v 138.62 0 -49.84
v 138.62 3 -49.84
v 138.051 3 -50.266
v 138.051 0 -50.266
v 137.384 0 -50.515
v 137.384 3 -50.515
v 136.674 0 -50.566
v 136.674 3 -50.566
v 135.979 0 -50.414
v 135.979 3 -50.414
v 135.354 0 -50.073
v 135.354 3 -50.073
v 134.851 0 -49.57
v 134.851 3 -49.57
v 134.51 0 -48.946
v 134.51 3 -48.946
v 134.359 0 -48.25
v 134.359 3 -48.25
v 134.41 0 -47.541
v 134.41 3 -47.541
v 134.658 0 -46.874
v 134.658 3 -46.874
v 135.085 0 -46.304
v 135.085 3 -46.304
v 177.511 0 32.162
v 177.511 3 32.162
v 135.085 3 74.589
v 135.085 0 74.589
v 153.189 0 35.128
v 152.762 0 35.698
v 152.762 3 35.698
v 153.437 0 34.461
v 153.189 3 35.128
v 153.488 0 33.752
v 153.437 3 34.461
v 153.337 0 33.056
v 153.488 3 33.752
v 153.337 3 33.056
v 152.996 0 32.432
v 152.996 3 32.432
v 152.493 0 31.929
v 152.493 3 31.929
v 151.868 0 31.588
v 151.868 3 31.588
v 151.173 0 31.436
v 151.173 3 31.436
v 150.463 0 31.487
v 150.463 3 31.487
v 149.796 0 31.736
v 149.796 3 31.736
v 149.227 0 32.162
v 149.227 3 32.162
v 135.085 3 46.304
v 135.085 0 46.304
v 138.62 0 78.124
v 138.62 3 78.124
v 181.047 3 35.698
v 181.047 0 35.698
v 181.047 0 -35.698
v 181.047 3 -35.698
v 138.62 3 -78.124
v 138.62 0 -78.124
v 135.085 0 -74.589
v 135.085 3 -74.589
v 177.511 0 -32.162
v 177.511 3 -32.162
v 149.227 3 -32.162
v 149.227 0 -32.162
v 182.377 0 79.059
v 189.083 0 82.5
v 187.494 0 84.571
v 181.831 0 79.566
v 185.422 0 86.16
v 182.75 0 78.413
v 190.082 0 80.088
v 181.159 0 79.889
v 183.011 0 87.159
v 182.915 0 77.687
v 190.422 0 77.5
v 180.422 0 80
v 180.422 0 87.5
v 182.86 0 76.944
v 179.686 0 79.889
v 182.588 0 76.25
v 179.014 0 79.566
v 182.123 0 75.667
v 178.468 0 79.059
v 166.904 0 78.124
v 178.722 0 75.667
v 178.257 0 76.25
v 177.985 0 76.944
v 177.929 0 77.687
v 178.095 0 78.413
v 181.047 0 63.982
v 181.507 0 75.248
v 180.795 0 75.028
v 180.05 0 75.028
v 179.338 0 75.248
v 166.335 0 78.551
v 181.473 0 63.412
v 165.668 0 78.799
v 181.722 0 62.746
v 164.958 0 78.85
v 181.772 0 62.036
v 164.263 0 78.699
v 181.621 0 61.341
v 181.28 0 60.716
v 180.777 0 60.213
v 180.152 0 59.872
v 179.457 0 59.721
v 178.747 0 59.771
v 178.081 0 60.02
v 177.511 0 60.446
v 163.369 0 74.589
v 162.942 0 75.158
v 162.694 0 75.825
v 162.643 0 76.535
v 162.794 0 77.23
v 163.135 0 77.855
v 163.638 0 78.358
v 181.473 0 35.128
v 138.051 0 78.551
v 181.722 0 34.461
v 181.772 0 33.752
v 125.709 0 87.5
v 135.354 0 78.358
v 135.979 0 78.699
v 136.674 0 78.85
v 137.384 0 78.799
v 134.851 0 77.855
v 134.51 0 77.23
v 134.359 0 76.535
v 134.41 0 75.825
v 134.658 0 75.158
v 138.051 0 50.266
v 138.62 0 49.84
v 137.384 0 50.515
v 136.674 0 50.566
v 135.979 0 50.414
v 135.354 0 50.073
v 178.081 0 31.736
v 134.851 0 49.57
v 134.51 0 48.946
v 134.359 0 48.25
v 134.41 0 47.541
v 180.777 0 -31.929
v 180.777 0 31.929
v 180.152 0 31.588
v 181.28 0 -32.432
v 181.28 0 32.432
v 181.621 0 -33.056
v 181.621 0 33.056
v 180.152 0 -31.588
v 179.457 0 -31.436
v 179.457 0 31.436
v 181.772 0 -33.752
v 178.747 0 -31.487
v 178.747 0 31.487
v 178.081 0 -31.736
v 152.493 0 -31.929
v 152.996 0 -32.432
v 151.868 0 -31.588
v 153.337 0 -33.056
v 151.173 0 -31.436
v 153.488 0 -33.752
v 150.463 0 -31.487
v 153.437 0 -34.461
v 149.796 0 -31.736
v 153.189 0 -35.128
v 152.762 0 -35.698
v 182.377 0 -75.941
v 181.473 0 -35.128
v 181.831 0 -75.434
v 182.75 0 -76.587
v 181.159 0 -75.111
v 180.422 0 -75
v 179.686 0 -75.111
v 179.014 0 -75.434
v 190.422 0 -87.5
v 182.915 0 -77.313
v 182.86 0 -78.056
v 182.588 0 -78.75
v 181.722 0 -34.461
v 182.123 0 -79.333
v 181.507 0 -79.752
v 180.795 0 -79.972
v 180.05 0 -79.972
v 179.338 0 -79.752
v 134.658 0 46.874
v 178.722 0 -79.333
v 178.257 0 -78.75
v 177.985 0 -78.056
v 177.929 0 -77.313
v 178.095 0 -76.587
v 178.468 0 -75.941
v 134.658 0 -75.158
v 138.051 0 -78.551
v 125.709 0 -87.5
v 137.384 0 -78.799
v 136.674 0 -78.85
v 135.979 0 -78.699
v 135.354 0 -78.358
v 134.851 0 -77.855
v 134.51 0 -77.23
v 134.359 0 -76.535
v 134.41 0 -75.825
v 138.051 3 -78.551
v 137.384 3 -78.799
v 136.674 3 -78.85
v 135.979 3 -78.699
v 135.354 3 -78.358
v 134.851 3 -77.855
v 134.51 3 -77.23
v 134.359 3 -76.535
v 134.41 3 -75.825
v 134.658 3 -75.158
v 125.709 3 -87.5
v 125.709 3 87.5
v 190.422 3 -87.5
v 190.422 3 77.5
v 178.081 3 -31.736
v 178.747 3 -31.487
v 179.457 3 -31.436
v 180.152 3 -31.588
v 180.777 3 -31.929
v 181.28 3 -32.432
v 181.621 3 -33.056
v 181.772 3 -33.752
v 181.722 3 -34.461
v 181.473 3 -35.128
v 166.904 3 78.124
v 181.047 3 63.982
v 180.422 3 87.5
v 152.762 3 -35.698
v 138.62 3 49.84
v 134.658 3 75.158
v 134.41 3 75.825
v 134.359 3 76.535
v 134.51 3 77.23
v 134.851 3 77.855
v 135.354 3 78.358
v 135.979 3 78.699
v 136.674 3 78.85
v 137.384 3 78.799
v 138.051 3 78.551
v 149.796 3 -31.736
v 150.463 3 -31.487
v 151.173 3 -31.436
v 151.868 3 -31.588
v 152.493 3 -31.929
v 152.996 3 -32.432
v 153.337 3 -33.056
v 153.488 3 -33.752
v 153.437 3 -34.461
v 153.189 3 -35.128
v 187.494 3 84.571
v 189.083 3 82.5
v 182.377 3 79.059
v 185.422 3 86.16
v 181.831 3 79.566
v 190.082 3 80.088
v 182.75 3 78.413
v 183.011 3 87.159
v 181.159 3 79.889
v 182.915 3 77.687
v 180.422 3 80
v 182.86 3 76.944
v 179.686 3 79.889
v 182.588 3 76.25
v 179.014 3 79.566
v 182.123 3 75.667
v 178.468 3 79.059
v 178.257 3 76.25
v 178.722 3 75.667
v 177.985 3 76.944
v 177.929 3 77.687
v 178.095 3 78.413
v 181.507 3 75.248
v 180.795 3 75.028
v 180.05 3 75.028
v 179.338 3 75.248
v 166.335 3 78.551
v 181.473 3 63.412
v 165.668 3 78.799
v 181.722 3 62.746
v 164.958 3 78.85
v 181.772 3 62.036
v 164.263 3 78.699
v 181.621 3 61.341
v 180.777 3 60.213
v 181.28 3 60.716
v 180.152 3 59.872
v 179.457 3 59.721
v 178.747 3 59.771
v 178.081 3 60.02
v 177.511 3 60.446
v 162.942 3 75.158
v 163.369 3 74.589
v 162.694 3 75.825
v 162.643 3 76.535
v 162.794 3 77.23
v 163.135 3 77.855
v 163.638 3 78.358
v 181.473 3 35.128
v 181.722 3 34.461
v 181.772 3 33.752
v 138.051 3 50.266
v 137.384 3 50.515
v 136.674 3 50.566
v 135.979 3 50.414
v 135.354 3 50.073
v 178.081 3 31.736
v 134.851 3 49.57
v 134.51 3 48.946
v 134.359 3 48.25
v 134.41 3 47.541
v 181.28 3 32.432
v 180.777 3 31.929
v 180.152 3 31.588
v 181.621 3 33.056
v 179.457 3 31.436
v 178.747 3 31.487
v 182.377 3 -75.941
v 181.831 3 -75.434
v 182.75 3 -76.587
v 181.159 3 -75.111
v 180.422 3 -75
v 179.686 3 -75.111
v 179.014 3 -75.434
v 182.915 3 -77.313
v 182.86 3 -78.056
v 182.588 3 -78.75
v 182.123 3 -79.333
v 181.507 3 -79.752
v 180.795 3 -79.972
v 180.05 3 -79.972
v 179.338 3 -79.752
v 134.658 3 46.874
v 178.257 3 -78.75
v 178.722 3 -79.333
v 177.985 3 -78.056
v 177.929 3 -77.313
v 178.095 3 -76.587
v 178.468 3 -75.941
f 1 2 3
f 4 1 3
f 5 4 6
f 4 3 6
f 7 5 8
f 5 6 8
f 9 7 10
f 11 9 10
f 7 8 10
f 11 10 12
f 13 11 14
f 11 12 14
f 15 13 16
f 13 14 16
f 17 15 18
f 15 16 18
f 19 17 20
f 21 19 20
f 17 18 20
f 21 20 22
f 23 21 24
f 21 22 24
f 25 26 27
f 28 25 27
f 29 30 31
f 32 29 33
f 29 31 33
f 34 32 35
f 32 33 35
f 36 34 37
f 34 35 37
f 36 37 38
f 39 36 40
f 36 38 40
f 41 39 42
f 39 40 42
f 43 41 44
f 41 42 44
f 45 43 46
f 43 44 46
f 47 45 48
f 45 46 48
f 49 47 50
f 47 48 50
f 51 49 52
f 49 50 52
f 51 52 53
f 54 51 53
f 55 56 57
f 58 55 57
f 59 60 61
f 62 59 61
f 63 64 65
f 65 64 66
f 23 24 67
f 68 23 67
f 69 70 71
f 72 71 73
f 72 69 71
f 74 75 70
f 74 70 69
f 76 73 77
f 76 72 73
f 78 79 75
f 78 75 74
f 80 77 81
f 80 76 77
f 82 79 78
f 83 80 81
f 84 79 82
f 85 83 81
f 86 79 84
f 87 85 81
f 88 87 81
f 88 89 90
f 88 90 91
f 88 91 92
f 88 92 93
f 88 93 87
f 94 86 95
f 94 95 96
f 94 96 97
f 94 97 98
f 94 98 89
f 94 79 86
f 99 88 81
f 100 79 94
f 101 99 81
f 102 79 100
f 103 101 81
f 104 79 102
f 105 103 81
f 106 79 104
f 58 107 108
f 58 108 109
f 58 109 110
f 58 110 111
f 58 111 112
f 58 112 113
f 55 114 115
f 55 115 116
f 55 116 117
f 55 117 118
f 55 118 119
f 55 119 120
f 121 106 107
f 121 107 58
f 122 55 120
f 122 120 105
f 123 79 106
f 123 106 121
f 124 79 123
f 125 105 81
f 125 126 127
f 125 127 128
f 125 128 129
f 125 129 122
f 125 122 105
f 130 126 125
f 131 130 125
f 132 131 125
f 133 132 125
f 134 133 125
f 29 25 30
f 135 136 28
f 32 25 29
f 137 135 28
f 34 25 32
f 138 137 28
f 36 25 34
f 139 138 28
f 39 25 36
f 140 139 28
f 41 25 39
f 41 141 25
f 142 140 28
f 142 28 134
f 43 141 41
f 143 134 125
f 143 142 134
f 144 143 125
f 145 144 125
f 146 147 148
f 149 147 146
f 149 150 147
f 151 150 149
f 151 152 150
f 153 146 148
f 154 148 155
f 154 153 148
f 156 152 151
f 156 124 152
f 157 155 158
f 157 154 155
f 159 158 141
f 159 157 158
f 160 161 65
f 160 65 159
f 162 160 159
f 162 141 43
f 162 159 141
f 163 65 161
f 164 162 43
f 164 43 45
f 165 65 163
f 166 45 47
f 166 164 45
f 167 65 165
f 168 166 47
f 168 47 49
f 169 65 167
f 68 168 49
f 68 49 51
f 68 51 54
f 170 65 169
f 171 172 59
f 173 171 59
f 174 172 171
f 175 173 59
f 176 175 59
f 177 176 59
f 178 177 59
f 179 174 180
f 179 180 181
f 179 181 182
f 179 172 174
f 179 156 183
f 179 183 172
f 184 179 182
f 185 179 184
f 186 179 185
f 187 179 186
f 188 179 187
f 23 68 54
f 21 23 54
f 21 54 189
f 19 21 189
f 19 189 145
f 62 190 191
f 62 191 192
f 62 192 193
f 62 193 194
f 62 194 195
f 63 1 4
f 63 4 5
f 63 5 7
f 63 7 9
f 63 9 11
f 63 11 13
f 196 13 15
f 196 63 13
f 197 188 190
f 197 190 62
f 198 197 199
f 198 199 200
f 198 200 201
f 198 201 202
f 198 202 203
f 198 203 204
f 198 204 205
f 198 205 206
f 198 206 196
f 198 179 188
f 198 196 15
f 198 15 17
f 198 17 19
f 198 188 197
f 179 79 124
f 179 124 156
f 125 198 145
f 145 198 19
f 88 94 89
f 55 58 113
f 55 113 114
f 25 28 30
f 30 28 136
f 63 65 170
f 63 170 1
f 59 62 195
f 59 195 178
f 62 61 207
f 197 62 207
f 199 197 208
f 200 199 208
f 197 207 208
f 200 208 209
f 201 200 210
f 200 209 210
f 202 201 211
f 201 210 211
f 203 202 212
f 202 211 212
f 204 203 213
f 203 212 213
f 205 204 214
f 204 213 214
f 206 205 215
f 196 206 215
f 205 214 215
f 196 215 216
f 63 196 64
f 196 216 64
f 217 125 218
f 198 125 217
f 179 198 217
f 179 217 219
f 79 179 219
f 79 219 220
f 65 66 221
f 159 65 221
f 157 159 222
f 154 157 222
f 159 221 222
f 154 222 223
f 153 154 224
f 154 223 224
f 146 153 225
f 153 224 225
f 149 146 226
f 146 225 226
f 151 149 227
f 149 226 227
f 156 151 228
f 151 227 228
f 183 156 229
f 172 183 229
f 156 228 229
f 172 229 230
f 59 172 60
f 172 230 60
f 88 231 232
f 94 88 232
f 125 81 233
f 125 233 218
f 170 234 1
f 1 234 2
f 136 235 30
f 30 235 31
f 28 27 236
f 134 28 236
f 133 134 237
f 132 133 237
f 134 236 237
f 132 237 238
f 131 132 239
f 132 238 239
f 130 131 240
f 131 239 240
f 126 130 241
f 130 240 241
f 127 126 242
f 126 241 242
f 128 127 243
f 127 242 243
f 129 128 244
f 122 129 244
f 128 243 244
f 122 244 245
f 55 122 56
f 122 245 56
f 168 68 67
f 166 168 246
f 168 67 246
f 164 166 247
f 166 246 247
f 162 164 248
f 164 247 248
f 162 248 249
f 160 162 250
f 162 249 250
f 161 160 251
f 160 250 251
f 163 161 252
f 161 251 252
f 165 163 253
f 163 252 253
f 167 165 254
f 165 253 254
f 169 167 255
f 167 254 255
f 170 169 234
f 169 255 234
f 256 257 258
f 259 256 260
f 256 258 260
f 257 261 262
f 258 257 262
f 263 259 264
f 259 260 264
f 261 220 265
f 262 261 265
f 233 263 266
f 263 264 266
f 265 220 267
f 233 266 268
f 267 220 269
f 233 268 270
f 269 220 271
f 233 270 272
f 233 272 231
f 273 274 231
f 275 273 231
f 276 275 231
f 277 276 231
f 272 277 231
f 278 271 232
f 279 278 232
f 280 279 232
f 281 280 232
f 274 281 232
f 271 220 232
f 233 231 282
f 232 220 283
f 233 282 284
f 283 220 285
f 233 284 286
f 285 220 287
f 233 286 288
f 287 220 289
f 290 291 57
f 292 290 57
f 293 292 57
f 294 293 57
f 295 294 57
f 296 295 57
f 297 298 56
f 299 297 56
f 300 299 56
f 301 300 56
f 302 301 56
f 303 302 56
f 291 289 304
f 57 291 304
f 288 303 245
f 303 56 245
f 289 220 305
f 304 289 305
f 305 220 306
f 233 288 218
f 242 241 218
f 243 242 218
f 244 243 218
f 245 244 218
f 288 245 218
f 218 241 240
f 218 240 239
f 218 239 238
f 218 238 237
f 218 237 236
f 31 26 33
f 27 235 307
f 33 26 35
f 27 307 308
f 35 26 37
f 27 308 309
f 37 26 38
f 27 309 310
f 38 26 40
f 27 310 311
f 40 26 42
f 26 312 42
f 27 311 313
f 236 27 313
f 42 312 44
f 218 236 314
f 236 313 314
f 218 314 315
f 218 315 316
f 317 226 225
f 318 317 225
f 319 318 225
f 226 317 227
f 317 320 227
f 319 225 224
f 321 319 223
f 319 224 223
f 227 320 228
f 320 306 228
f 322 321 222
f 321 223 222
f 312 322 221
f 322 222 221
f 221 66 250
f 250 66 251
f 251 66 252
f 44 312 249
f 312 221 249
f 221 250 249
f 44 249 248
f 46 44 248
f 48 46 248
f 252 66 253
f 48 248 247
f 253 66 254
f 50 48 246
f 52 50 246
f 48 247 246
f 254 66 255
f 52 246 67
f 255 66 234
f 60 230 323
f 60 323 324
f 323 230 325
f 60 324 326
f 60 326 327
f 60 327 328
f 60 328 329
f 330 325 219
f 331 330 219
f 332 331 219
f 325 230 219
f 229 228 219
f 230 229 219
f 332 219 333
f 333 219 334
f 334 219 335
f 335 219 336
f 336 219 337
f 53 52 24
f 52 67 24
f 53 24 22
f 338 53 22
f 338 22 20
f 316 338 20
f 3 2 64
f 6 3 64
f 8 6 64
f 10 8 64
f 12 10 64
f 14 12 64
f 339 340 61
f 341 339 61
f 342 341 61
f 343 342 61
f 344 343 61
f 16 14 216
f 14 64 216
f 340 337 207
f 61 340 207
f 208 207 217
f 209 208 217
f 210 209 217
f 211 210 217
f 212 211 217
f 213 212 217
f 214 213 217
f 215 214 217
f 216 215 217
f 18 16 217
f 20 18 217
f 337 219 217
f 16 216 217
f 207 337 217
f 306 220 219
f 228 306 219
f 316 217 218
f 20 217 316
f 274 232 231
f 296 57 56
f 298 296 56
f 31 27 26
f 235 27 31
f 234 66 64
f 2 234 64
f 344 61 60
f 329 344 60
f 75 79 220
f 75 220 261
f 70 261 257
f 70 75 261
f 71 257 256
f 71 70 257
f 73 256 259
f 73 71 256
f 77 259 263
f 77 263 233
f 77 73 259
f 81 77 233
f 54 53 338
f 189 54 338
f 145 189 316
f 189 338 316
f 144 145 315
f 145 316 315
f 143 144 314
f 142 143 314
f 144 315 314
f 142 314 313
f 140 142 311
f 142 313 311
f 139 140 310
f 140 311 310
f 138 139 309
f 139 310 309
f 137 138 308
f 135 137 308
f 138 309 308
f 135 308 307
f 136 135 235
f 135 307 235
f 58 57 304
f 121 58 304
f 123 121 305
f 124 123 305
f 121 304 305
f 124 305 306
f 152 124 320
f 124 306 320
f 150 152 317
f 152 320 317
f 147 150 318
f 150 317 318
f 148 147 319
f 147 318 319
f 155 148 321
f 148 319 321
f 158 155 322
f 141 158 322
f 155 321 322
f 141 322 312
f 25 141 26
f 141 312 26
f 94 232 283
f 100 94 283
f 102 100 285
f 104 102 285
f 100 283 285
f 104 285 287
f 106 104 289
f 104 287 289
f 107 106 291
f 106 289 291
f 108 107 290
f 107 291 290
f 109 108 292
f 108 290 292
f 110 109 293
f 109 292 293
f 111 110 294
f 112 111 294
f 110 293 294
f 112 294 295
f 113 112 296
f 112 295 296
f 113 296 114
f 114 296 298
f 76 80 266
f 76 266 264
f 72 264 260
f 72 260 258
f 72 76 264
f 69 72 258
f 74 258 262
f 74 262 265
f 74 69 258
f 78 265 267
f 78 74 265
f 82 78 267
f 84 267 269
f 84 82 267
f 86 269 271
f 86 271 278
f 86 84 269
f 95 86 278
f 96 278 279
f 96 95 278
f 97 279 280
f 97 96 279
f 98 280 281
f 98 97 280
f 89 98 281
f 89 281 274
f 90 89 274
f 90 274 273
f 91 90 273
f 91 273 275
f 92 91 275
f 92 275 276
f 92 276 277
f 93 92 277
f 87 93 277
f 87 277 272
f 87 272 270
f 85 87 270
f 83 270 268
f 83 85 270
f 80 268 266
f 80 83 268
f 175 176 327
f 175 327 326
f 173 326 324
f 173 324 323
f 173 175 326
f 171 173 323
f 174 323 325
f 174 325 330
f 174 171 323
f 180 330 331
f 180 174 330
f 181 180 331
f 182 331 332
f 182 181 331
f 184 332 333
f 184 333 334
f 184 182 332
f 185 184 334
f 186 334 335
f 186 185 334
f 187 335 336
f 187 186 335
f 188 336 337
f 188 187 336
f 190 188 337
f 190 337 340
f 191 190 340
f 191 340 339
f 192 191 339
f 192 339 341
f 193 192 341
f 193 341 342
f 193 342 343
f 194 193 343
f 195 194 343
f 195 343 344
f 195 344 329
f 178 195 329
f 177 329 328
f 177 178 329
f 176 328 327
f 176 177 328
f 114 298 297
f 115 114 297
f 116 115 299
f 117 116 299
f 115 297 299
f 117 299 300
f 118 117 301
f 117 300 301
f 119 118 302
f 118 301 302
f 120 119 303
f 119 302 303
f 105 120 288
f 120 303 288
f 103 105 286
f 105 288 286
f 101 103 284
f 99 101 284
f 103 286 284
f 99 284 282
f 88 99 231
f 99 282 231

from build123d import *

# Parameters (mm, degrees)
ESQUISSE1_R             = 2.5
BOSS_EXTRU_1_DEPTH      = 3
ENL_V_MAT_EXTRU_1_DEPTH = 210.585226303


with BuildPart() as part:
    # Esquisse1 → Boss.-Extru.1 (new body)
    with BuildSketch(Plane(origin=(0, 0, 0), x_dir=(1, 0, 0), z_dir=(0, 1, 0))):
        with BuildLine():
            Line((125.70871342, 87.5), (180.42247001, 87.5))
            Line((180.42247001, 87.5), (190.42247001, 87.5))
            Line((190.42247001, 87.5), (190.42247001, 77.5))
            Line((190.42247001, 77.5), (190.42247001, -77.5))
            ThreePointArc((190.42247001, -77.5), (187.493537821, -84.571067812), (180.42247001, -87.5))
            Line((180.42247001, -87.5), (125.70871342, -87.5))
            Line((125.70871342, -87.5), (125.70871342, 87.5))
        make_face()
        with Locations(Location((180.42247001, 77.5, 0), (0, 0, 270))):
            Circle(ESQUISSE1_R, mode=Mode.SUBTRACT)
        with Locations(Location((180.42247001, -77.5, 0), (0, 0, 270))):
            Circle(ESQUISSE1_R, mode=Mode.SUBTRACT)
    extrude(amount=BOSS_EXTRU_1_DEPTH)

    # Esquisse2 → Enlèv. mat.-Extru.1 (cut, through all)
    with BuildSketch(Plane(origin=(0, 3, 0), x_dir=(1, 0, 0), z_dir=(0, 1, 0))):
        with BuildLine():
            Line((138.620155232, -78.124092094), (181.046562103, -35.697685223))
            ThreePointArc((181.046562103, -35.697685223), (181.046562103, -32.162151317), (177.511028197, -32.162151317))
            Line((177.511028197, -32.162151317), (135.084621326, -74.588558188))
            ThreePointArc((135.084621326, -74.588558188), (135.084621326, -78.124092094), (138.620155232, -78.124092094))
        make_face()
        with BuildLine():
            Line((166.90442648, -78.124092094), (181.046562103, -63.98195647))
            ThreePointArc((181.046562103, -63.98195647), (181.046562103, -60.446422564), (177.511028197, -60.446422564))
            Line((177.511028197, -60.446422564), (163.368892574, -74.588558188))
            ThreePointArc((163.368892574, -74.588558188), (163.368892574, -78.124092094), (166.90442648, -78.124092094))
        make_face()
        with BuildLine():
            Line((138.620155232, -49.839820846), (152.762290856, -35.697685223))
            ThreePointArc((152.762290856, -35.697685223), (152.762290856, -32.162151317), (149.22675695, -32.162151317))
            Line((149.22675695, -32.162151317), (135.084621326, -46.30428694))
            ThreePointArc((135.084621326, -46.30428694), (135.084621326, -49.839820846), (138.620155232, -49.839820846))
        make_face()
        with BuildLine():
            Line((135.084621326, 74.588558188), (177.511028197, 32.162151317))
            ThreePointArc((177.511028197, 32.162151317), (181.046562103, 32.162151317), (181.046562103, 35.697685223))
            Line((181.046562103, 35.697685223), (138.620155232, 78.124092094))
            ThreePointArc((138.620155232, 78.124092094), (135.084621326, 78.124092094), (135.084621326, 74.588558188))
        make_face()
        with BuildLine():
            Line((135.084621326, 46.30428694), (149.22675695, 32.162151317))
            ThreePointArc((149.22675695, 32.162151317), (152.762290856, 32.162151317), (152.762290856, 35.697685223))
            Line((152.762290856, 35.697685223), (138.620155232, 49.839820846))
            ThreePointArc((138.620155232, 49.839820846), (135.084621326, 49.839820846), (135.084621326, 46.30428694))
        make_face()
    extrude(amount=-ENL_V_MAT_EXTRU_1_DEPTH, mode=Mode.SUBTRACT)


solid = part.part
